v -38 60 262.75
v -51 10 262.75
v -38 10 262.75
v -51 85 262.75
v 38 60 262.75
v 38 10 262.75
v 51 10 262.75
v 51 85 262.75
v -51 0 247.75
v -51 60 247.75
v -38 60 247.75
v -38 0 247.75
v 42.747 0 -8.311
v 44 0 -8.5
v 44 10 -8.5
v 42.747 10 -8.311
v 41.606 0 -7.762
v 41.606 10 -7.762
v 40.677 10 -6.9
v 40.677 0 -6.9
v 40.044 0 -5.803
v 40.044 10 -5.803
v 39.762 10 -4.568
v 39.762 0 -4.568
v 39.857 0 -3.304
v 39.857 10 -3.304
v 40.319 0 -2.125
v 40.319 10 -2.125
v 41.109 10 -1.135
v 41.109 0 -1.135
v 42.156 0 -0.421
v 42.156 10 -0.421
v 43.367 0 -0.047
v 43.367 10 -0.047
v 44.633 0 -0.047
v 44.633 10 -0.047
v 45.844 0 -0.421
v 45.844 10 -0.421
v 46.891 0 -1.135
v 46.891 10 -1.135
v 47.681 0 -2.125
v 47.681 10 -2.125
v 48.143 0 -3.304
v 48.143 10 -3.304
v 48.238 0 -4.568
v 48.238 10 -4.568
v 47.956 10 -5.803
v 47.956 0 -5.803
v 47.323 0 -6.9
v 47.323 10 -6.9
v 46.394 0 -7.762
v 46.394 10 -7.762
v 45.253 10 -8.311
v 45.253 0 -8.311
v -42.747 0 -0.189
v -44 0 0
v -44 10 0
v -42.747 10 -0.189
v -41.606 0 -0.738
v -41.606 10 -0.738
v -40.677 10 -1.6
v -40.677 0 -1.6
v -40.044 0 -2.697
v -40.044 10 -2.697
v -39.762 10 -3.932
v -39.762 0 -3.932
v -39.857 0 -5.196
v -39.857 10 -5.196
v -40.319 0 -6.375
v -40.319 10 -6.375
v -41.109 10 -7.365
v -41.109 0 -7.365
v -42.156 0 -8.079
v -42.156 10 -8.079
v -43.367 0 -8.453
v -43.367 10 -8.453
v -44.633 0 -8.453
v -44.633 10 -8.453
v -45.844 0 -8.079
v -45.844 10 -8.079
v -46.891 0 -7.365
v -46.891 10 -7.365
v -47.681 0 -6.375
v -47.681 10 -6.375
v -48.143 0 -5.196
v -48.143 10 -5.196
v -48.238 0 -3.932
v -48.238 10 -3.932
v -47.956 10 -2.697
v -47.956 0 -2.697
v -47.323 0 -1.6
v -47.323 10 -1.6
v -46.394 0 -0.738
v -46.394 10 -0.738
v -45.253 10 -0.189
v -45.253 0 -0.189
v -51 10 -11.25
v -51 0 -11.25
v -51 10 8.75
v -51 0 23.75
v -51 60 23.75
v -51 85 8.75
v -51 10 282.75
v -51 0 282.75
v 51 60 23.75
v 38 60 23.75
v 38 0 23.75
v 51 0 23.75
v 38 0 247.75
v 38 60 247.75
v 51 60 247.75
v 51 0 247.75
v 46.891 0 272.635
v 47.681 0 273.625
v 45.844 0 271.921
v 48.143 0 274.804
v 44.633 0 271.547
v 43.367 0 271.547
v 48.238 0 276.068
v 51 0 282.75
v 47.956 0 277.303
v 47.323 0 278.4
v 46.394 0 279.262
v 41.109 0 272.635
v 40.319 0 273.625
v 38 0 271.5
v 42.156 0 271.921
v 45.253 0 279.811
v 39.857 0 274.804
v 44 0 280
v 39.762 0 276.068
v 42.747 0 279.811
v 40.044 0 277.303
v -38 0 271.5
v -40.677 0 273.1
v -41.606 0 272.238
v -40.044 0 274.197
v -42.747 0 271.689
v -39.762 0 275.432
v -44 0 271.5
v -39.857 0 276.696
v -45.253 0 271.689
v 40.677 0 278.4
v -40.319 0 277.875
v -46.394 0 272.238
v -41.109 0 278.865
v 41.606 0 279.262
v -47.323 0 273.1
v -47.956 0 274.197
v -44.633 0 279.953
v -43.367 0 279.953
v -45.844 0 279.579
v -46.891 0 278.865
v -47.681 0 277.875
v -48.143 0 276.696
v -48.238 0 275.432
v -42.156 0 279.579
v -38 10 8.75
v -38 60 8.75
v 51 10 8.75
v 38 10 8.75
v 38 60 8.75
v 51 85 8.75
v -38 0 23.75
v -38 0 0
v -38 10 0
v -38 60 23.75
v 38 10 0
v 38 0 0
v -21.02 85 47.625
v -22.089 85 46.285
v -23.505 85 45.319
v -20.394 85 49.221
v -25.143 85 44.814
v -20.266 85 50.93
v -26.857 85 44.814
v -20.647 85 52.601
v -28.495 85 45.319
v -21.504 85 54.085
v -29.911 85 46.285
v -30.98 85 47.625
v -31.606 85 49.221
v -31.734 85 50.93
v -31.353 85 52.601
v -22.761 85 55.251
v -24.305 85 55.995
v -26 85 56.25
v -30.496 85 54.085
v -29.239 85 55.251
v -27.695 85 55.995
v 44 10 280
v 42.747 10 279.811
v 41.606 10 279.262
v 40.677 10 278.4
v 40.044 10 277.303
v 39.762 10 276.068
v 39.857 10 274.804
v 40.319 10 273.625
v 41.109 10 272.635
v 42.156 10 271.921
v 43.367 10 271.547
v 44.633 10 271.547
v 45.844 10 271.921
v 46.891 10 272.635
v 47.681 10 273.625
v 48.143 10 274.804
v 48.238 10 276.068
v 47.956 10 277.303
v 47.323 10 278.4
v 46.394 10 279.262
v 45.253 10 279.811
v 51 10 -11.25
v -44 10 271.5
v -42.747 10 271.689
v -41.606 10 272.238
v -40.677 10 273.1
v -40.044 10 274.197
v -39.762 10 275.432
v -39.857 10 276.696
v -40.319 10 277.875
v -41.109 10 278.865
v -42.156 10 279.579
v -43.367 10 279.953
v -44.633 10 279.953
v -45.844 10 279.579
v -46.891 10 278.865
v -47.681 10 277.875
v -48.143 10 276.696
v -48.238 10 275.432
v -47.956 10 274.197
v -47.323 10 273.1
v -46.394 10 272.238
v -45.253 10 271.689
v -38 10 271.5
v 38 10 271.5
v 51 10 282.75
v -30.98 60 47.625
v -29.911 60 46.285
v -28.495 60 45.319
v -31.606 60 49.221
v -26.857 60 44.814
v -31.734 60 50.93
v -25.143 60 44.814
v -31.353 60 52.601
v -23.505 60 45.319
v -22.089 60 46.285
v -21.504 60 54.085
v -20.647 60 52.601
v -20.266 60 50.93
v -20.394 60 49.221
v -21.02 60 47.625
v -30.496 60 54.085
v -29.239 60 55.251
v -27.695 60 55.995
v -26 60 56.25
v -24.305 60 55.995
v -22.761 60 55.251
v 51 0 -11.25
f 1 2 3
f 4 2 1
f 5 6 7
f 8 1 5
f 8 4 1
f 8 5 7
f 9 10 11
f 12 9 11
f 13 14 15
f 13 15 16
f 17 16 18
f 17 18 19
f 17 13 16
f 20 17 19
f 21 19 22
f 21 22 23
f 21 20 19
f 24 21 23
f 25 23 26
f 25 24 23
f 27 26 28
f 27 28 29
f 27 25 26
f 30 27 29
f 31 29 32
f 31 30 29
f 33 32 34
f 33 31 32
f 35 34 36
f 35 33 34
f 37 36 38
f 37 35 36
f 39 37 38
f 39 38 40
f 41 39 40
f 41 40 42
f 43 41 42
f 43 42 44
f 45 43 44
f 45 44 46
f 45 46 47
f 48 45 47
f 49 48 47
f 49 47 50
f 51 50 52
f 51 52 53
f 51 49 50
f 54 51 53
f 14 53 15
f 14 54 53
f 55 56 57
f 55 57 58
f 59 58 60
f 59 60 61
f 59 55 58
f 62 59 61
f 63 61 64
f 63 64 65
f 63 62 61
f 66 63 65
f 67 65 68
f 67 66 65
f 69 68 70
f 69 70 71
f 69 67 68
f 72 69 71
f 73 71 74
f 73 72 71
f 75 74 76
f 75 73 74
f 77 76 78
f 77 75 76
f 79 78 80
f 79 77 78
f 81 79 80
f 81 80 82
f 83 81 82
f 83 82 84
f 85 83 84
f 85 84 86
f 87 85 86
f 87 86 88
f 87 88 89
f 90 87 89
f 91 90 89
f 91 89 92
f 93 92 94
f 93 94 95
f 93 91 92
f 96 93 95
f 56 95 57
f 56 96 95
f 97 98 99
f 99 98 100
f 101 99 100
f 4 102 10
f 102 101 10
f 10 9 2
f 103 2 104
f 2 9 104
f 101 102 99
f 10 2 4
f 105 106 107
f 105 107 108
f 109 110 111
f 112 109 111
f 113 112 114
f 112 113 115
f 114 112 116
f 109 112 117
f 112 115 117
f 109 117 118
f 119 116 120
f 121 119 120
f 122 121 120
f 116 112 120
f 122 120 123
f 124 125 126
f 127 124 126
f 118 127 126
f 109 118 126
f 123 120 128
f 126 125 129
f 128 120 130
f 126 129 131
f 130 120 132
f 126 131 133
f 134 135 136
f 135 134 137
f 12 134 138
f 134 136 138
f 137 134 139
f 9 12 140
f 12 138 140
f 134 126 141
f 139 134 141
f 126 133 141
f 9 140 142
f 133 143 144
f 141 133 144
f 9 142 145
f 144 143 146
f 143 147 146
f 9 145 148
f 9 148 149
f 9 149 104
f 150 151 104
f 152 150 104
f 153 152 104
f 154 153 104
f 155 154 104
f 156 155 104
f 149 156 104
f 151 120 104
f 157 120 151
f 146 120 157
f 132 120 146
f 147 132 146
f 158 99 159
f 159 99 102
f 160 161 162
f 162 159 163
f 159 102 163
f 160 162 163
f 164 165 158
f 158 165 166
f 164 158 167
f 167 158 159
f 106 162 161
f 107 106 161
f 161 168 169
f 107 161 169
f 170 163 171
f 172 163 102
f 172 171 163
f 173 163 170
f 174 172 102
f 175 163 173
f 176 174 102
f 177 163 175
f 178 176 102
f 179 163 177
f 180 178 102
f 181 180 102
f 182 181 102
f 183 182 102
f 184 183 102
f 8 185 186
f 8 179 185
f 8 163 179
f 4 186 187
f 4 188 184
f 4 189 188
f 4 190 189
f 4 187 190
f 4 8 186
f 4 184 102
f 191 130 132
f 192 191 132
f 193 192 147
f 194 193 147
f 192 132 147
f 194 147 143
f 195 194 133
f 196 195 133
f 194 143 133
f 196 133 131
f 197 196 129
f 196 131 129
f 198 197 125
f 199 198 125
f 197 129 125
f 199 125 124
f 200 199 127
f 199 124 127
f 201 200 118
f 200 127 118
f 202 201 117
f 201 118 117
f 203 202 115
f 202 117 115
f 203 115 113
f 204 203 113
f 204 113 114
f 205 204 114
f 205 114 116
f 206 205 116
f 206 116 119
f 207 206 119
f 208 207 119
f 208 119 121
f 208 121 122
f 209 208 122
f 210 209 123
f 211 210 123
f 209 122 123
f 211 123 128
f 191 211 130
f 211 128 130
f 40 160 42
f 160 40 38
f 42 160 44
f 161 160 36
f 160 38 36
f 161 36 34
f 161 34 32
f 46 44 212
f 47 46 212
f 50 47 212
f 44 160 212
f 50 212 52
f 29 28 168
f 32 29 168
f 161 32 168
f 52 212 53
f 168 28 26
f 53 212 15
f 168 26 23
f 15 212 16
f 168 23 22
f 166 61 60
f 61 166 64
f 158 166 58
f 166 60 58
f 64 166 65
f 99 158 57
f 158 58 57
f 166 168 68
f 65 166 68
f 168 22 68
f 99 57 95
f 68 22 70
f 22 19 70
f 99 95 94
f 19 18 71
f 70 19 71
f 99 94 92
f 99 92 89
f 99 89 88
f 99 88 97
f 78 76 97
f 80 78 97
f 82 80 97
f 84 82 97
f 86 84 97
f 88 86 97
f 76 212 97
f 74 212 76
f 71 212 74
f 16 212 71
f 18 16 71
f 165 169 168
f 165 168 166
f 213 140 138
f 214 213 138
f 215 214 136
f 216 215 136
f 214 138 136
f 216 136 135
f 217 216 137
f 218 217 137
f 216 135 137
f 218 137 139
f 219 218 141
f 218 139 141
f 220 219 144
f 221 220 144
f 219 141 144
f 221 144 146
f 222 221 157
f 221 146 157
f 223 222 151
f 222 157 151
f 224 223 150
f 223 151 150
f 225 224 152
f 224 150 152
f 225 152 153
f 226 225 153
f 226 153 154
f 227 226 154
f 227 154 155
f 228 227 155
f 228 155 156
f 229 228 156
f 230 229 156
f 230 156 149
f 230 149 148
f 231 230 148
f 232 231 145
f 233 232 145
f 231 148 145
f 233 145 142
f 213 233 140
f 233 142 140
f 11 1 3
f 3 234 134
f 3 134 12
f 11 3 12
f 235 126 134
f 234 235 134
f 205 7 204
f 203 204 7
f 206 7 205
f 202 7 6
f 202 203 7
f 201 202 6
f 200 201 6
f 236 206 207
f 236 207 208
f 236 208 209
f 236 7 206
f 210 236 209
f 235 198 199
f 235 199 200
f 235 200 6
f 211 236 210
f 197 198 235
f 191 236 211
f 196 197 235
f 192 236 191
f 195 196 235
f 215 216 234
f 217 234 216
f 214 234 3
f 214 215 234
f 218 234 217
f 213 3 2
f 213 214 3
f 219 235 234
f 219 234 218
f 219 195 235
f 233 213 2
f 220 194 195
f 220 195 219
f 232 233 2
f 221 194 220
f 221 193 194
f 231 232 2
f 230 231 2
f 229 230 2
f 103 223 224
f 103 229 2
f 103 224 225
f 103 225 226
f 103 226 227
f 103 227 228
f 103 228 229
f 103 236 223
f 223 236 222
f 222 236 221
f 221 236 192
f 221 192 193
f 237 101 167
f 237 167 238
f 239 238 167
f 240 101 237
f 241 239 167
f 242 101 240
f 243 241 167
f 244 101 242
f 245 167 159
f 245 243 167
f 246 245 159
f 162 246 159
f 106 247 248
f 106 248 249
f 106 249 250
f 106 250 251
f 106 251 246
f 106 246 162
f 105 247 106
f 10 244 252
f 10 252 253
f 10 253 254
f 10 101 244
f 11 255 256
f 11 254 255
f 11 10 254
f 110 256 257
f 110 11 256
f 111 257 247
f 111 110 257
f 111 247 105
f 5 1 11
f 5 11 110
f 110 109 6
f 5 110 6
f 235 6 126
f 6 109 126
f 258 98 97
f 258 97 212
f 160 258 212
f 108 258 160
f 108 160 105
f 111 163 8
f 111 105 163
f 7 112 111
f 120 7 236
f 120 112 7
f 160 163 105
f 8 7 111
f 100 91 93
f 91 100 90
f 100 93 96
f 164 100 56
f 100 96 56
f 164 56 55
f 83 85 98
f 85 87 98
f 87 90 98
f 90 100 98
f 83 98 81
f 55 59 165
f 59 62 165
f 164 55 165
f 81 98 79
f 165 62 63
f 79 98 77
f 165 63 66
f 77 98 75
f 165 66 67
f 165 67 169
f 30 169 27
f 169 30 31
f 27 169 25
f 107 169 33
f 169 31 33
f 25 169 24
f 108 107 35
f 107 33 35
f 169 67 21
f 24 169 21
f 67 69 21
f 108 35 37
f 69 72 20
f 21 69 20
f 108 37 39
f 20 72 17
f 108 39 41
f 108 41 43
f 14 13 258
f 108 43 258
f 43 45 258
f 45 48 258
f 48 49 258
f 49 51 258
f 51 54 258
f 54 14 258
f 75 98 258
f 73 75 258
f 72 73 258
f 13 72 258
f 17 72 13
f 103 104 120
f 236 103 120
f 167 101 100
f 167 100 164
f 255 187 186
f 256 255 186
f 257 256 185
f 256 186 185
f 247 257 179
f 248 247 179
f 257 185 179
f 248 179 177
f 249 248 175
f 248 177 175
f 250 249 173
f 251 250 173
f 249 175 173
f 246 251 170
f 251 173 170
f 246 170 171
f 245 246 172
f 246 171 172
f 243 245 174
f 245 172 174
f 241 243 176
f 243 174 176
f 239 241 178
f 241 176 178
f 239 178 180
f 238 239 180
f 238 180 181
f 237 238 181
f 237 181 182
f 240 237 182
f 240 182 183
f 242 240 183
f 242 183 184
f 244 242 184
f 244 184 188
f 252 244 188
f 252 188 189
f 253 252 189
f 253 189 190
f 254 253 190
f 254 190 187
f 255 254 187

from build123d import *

# Parameters (mm, degrees)
SKETCH1_R           = 4.25
BOSS_EXTRUDE1_DEPTH = 10
BOSS_EXTRUDE2_START = -5
BOSS_EXTRUDE2_DEPTH = 15
SKETCH3_W           = 102
SKETCH3_H           = 25
BOSS_EXTRUDE3_DEPTH = 224
CUT_EXTRUDE1_REACH  = 268.845
SKETCH4_R           = 5.75


with BuildPart() as part:
    # Sketch1 → Boss-Extrude1 (new body)
    with BuildSketch(Plane(origin=(0, 0, 0), x_dir=(1, 0, 0), z_dir=(0, 1, 0))):
        Polygon((-51, 11.25), (51, 11.25), (51, 0), (51, -13.75), (38, -13.75), (38, 0), (-38, 0), (-38, -13.75), (-51, -13.75), align=None)
        with Locations(Location((-44, 4.25, 0), (0, 0, 270))):
            Circle(SKETCH1_R, mode=Mode.SUBTRACT)
        with Locations(Location((44, 4.25, 0), (0, 0, 90))):
            Circle(SKETCH1_R, mode=Mode.SUBTRACT)
    boss_extrude1 = extrude(amount=BOSS_EXTRUDE1_DEPTH)

    # Sketch2 → Boss-Extrude2 (add)
    with BuildSketch(Plane.XY.offset(13.75).offset(BOSS_EXTRUDE2_START)):
        Polygon((-51, 85), (-51, 0), (-38, 0), (-38, 60), (38, 60), (38, 0), (51, 0), (51, 85), align=None)
    boss_extrude2 = extrude(amount=BOSS_EXTRUDE2_DEPTH)

    # Sketch3 → Boss-Extrude3 (add)
    with BuildSketch(Plane.XY.offset(23.75)):
        with Locations((0, 72.5)):
            Rectangle(SKETCH3_W, SKETCH3_H)
    extrude(amount=BOSS_EXTRUDE3_DEPTH)

    # Sketch4 → Cut-Extrude1 (cut, up to next)
    with BuildSketch(Plane(origin=(0, 85, 0), x_dir=(1, 0, 0), z_dir=(0, 1, 0)), mode=Mode.PRIVATE) as cut_extrude1_sk1:
        with Locations(Location((-26, -50.5, 0), (0, 0, 270))):
            Circle(SKETCH4_R)
    cut_extrude1_tool1 = extrude(cut_extrude1_sk1.sketch, amount=-CUT_EXTRUDE1_REACH, mode=Mode.PRIVATE) & part.part
    add(cut_extrude1_tool1.solids().sort_by_distance((-26, 85, 50.5))[0], mode=Mode.SUBTRACT)

    # Mirror3: Boss-Extrude2 across plane
    add(boss_extrude2.mirror(Plane(origin=(0, 0, 135.75), x_dir=(1, 0, 0), z_dir=(0, 0, -1))))

    # Mirror4: Boss-Extrude1 across plane
    add(boss_extrude1.mirror(Plane(origin=(0, 0, 135.75), x_dir=(1, 0, 0), z_dir=(0, 0, -1))))


solid = part.part
